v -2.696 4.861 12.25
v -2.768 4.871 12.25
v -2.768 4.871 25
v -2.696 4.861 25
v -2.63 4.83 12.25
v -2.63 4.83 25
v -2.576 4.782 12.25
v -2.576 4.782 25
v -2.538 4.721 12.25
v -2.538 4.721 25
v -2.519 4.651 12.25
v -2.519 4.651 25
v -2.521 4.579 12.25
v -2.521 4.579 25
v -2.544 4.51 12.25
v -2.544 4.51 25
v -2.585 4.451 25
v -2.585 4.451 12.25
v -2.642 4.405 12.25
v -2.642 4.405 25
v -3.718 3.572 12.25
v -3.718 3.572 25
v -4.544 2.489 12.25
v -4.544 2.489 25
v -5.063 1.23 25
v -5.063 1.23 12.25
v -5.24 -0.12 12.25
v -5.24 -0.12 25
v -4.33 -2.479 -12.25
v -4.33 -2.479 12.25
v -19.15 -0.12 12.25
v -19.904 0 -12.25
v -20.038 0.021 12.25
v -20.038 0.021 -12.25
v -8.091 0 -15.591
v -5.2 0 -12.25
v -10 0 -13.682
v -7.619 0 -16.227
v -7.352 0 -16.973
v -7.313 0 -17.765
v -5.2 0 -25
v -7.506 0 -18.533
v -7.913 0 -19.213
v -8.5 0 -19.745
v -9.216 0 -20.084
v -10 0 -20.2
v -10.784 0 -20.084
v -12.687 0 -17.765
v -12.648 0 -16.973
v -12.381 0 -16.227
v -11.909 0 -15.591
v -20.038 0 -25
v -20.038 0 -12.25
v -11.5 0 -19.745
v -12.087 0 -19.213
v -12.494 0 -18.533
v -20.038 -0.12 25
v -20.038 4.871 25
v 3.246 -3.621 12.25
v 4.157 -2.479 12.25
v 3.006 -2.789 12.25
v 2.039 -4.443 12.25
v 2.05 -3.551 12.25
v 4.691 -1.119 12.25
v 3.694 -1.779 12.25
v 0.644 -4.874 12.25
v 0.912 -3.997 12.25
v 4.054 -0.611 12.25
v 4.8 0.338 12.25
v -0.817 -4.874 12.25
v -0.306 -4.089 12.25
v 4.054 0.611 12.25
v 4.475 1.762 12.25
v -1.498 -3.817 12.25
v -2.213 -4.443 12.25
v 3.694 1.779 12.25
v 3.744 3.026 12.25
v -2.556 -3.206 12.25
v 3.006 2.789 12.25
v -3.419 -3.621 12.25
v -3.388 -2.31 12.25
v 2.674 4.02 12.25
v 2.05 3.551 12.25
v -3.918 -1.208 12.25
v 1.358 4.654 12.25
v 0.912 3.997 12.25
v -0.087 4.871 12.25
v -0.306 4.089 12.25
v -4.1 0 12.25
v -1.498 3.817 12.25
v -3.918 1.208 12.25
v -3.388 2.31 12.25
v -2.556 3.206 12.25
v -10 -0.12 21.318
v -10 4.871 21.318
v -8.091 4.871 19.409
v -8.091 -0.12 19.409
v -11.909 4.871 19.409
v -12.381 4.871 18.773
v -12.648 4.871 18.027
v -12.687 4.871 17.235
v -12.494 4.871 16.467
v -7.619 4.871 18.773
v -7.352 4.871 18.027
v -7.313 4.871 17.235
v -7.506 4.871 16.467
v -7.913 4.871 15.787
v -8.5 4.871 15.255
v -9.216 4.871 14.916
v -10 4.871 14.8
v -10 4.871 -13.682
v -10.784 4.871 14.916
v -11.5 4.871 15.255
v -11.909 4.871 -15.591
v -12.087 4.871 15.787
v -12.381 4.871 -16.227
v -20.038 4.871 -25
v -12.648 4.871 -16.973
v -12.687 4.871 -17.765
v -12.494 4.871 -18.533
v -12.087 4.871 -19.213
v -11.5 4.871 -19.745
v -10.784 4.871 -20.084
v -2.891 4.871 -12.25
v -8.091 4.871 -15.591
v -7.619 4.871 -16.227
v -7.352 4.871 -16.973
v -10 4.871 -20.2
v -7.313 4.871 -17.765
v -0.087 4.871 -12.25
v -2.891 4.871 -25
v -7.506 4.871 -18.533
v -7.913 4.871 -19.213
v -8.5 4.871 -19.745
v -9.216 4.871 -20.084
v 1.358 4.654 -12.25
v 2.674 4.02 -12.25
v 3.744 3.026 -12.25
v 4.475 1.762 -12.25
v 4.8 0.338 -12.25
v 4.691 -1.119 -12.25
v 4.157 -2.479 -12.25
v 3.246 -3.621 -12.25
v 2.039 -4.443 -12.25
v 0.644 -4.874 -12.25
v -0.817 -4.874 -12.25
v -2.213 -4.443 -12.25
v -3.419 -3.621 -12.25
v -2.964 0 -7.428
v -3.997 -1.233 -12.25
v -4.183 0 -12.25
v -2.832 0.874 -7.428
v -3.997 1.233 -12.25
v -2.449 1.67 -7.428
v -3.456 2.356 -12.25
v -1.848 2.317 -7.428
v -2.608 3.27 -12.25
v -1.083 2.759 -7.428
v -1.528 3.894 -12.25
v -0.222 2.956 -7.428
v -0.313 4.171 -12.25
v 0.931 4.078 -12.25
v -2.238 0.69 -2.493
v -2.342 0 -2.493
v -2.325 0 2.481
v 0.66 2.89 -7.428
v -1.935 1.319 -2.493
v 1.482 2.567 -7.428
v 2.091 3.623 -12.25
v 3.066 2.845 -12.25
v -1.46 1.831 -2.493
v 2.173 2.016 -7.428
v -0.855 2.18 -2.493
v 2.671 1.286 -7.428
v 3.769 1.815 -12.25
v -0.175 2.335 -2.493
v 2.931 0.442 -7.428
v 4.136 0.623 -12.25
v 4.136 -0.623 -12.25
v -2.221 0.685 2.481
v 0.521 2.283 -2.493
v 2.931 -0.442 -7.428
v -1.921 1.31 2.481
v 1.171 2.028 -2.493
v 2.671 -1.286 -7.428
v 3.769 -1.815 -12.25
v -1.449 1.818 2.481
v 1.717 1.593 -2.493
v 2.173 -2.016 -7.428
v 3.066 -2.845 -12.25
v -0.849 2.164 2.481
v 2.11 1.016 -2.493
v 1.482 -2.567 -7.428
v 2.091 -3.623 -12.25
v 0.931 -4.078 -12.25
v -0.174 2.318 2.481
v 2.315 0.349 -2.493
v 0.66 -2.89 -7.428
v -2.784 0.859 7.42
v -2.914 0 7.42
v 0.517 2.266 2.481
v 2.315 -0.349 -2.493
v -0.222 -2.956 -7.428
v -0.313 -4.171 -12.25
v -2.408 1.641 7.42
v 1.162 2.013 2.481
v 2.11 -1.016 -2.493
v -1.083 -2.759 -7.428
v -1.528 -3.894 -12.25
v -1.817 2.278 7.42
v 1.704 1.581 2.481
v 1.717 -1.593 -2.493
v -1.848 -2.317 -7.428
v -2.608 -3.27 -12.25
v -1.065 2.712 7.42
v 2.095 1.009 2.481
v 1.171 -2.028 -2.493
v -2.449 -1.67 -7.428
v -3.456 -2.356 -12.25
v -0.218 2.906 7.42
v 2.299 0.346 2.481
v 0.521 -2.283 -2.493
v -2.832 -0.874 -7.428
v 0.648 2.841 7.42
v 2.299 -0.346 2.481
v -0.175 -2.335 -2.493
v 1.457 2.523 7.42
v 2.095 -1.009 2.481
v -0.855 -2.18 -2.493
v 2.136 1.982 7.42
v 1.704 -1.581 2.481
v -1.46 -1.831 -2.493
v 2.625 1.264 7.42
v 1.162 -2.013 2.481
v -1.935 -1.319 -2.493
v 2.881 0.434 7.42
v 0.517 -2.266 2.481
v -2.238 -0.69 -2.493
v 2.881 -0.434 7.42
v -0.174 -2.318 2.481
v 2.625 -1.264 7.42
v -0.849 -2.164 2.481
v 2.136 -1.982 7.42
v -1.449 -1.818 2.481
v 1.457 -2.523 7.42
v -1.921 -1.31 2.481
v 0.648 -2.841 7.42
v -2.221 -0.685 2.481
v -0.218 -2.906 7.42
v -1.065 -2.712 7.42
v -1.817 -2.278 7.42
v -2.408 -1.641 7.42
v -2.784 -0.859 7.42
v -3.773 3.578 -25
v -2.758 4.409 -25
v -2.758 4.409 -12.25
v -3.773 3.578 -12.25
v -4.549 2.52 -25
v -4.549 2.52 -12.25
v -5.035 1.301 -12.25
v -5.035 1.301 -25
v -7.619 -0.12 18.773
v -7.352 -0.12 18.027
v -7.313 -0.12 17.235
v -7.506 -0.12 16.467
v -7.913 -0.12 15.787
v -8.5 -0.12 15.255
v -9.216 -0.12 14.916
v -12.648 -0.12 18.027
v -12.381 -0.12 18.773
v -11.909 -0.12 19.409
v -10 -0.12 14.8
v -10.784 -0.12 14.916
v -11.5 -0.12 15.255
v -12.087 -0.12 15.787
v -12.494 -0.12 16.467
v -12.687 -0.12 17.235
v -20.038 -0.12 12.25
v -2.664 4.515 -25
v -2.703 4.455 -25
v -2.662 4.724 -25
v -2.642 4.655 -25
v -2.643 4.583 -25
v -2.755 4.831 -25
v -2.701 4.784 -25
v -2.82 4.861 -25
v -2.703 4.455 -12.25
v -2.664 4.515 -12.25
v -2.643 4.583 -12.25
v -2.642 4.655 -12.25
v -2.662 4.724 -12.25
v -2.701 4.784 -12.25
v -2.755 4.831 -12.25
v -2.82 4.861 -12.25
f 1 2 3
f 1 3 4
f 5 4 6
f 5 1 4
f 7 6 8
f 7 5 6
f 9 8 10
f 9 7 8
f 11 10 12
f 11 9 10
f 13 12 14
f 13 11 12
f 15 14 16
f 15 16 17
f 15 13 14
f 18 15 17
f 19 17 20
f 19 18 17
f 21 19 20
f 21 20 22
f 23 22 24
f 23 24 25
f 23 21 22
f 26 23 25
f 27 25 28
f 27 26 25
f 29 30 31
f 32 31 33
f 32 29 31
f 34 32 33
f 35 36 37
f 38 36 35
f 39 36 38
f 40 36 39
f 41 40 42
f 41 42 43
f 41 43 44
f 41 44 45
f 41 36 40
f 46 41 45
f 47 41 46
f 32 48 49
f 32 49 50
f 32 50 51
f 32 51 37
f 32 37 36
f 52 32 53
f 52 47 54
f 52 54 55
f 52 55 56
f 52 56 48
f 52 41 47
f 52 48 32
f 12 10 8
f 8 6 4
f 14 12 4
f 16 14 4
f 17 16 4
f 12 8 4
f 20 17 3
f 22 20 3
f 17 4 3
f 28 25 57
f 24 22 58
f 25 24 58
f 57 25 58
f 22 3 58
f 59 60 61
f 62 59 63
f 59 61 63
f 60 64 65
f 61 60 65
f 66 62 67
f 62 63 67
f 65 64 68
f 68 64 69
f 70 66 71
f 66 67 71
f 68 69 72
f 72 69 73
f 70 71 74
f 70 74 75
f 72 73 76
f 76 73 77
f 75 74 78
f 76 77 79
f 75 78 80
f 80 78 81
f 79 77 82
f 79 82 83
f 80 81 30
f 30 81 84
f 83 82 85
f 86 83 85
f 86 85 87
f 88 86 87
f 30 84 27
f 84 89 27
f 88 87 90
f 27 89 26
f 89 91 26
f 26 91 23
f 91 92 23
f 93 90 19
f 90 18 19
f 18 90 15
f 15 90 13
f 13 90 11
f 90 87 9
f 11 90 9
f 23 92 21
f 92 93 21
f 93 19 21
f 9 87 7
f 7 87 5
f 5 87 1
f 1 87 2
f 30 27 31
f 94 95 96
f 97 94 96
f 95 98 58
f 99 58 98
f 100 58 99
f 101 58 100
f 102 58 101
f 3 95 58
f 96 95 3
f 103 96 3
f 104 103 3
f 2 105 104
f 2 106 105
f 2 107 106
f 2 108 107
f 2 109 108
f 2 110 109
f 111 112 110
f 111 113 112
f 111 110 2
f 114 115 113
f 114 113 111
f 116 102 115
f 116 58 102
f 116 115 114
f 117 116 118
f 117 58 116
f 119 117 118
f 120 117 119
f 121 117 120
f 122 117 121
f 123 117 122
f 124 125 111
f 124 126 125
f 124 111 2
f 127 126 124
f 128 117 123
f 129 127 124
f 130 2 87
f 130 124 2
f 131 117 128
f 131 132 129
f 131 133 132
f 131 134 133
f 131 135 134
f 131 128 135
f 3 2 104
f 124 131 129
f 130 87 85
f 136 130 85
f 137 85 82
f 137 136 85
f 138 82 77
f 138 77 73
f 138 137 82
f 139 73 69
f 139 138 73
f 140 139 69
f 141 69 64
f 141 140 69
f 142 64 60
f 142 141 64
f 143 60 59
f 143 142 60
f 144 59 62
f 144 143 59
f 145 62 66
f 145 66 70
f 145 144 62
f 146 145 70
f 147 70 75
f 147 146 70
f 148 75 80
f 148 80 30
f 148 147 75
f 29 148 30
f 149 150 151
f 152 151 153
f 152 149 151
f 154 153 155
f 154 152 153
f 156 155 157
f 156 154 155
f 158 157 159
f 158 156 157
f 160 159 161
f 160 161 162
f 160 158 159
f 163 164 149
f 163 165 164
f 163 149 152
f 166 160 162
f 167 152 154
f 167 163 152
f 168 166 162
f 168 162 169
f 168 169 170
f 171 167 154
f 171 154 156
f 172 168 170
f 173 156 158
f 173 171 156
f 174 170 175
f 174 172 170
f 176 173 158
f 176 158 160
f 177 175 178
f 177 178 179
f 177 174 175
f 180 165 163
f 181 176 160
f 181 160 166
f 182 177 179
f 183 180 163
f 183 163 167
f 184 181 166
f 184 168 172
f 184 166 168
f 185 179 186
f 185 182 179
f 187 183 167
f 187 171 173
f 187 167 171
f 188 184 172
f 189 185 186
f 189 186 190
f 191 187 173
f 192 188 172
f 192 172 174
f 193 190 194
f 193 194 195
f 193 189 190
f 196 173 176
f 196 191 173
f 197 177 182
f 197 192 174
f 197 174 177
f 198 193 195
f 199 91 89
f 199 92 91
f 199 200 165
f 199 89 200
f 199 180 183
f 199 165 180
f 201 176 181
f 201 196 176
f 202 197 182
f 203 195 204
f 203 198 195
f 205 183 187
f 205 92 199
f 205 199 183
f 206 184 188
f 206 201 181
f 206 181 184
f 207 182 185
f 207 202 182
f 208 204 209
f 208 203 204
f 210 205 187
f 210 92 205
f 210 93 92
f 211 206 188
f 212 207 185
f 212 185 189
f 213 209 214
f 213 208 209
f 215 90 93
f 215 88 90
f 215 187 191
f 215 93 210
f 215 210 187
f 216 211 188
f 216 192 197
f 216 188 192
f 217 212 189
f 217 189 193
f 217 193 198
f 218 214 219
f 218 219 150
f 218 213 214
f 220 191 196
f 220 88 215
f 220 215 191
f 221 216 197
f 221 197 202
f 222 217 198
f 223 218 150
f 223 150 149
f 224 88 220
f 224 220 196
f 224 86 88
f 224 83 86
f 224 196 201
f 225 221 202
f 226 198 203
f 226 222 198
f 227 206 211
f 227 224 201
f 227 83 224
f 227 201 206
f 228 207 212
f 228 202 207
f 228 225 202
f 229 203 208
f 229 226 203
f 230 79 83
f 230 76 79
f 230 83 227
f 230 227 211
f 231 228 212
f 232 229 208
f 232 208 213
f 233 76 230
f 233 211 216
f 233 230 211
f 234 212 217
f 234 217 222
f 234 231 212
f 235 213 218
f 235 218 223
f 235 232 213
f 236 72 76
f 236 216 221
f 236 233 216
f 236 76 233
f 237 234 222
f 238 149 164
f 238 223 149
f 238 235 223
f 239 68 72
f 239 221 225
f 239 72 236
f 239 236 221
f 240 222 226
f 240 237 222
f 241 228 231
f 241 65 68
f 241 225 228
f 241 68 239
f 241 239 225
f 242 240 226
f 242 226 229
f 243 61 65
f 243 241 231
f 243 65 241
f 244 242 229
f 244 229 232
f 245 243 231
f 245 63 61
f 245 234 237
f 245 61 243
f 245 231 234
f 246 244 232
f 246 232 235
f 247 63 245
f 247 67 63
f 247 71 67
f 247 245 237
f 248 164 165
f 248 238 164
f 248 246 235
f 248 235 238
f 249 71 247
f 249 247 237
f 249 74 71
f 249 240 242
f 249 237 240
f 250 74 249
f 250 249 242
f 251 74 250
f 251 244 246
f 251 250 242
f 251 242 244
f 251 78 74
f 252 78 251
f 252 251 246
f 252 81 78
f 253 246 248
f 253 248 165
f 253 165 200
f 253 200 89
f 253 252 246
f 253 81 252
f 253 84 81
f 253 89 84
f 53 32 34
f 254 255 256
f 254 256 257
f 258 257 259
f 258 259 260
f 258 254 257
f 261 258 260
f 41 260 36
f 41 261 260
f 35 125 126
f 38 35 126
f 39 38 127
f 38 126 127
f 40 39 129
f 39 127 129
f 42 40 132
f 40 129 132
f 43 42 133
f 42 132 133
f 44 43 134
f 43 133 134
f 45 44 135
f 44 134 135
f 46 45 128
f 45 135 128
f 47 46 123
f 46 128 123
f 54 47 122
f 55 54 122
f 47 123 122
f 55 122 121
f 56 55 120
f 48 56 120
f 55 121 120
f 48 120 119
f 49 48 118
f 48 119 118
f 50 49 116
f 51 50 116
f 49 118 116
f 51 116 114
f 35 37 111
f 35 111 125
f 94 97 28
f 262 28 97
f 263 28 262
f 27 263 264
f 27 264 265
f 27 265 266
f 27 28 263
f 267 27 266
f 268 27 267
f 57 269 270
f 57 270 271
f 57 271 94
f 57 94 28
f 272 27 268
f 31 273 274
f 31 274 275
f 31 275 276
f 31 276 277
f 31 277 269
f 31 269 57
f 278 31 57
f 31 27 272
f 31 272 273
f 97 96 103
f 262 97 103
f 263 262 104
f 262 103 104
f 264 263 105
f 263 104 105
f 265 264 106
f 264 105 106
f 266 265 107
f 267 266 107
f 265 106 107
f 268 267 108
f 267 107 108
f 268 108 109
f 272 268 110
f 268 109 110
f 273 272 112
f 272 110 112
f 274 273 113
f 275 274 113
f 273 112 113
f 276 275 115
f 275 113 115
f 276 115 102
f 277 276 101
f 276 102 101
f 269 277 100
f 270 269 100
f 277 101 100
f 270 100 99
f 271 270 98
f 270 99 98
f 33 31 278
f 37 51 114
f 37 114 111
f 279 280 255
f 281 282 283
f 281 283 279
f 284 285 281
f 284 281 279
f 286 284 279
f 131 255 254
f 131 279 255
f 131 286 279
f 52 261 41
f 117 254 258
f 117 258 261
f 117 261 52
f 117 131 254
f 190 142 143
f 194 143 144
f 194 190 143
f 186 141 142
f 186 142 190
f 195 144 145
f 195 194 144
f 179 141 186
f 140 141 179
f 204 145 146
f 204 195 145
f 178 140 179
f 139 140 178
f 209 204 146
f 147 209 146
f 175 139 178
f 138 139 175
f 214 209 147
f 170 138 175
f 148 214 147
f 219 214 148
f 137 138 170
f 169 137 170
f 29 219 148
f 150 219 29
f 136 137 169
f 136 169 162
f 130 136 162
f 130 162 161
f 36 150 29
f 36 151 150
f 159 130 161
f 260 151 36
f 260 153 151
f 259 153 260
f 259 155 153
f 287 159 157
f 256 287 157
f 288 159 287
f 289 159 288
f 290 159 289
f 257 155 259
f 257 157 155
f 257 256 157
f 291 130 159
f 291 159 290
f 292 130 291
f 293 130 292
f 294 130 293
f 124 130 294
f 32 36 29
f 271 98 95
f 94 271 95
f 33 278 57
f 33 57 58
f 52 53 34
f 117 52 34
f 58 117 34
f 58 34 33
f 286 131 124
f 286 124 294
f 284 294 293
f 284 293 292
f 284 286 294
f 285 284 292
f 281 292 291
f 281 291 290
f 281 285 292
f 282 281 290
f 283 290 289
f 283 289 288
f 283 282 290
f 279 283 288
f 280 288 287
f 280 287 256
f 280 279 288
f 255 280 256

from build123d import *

# Parameters (mm, degrees)
BOSS_EXTRUDE1_DEPTH = 12.75
BOSS_EXTRUDE2_DEPTH = 24.5
BOSS_EXTRUDE3_DEPTH = 12.75
CUT_EXTRUDE1_DEPTH  = 34.504705063
CUT_EXTRUDE2_DEPTH  = 34.504705063


with BuildPart() as part:
    # Sketch1 → Boss-Extrude1 (new body)
    with BuildSketch(Plane(origin=(0, 0, -25), x_dir=(-1, 0, 0), z_dir=(0, 0, -1))):
        with BuildLine():
            Line((5.2, 0), (20.038095252, 0))
            Line((20.038095252, 0), (20.038095252, 4.871341922))
            Line((20.038095252, 4.871341922), (2.890551941, 4.871341922))
            ThreePointArc((2.890551941, 4.871341922), (2.649795512, 4.689964666), (2.757716863, 4.408514229))
            ThreePointArc((2.757716863, 4.408514229), (4.548633184, 2.519907966), (5.2, 0))
        make_face()
    extrude(amount=-BOSS_EXTRUDE1_DEPTH)

    # Sketch2 → Boss-Extrude2 (add)
    with BuildSketch(Plane.XY.offset(-12.25)):
        with BuildLine():
            Line((-20.038095252, 4.871341922), (-0.08660254, 4.871341922))
            ThreePointArc((-0.08660254, 4.871341922), (4.156921938, -2.478658078), (-4.330127019, -2.478658078))
            Line((-4.330127019, -2.478658078), (-20.038095252, 0.021341922))
            Line((-20.038095252, 0.021341922), (-20.038095252, 4.871341922))
        make_face()
    extrude(amount=BOSS_EXTRUDE2_DEPTH)

    # Sketch3 → Boss-Extrude3 (add)
    with BuildSketch(Plane.XY.offset(12.25)):
        with BuildLine():
            Line((-20.038095252, 4.871341922), (-2.767593084, 4.871341922))
            ThreePointArc((-2.767593084, 4.871341922), (-2.52626626, 4.686621046), (-2.641564255, 4.405432834))
            ThreePointArc((-2.641564255, 4.405432834), (-4.544193916, 2.489173945), (-5.24, -0.12002165))
            Line((-5.24, -0.12002165), (-20.038095252, -0.12002165))
            Line((-20.038095252, -0.12002165), (-20.038095252, 4.871341922))
        make_face()
    extrude(amount=BOSS_EXTRUDE3_DEPTH)

    # Sketch4 → Cut-Extrude1 (cut, through all)
    with BuildSketch(Plane(origin=(0, 4.871341922, 0), x_dir=(-1, 0, 0), z_dir=(0, 1, 0))):
        with BuildLine():
            Line((10, -13.681623382), (8.090811691, -15.590811691))
            ThreePointArc((8.090811691, -15.590811691), (10, -20.2), (11.909188309, -15.590811691))
            Line((11.909188309, -15.590811691), (10, -13.681623382))
        make_face()
    extrude(amount=-CUT_EXTRUDE1_DEPTH, mode=Mode.SUBTRACT)

    # Sketch5 → Cut-Extrude2 (cut, through all)
    with BuildSketch(Plane(origin=(0, 4.871341922, 0), x_dir=(-1, 0, 0), z_dir=(0, 1, 0))):
        with BuildLine():
            Line((10, 21.318376618), (8.090811691, 19.409188309))
            ThreePointArc((8.090811691, 19.409188309), (10, 14.8), (11.909188309, 19.409188309))
            Line((11.909188309, 19.409188309), (10, 21.318376618))
        make_face()
    extrude(amount=-CUT_EXTRUDE2_DEPTH, mode=Mode.SUBTRACT)

    # Sketch6 → Cut-Revolve1 (revolve, cut)
    with BuildSketch(Plane.XZ, mode=Mode.PRIVATE) as cut_revolve1_sk:
        with BuildLine():
            Line((4.1, 12.25), (0, 12.25))
            Line((0, 12.25), (0, -12.25))
            Line((0, -12.25), (4.182916362, -12.25))
            ThreePointArc((4.182916362, -12.25), (2.257265667, -0.006376751), (4.1, 12.25))
        make_face()
    revolve(cut_revolve1_sk.sketch.rotate(Axis((0, 0, 12.25), (0, 0, -1)), 180), axis=Axis((0, 0, 12.25), (0, 0, -1)), mode=Mode.SUBTRACT)


solid = part.part
